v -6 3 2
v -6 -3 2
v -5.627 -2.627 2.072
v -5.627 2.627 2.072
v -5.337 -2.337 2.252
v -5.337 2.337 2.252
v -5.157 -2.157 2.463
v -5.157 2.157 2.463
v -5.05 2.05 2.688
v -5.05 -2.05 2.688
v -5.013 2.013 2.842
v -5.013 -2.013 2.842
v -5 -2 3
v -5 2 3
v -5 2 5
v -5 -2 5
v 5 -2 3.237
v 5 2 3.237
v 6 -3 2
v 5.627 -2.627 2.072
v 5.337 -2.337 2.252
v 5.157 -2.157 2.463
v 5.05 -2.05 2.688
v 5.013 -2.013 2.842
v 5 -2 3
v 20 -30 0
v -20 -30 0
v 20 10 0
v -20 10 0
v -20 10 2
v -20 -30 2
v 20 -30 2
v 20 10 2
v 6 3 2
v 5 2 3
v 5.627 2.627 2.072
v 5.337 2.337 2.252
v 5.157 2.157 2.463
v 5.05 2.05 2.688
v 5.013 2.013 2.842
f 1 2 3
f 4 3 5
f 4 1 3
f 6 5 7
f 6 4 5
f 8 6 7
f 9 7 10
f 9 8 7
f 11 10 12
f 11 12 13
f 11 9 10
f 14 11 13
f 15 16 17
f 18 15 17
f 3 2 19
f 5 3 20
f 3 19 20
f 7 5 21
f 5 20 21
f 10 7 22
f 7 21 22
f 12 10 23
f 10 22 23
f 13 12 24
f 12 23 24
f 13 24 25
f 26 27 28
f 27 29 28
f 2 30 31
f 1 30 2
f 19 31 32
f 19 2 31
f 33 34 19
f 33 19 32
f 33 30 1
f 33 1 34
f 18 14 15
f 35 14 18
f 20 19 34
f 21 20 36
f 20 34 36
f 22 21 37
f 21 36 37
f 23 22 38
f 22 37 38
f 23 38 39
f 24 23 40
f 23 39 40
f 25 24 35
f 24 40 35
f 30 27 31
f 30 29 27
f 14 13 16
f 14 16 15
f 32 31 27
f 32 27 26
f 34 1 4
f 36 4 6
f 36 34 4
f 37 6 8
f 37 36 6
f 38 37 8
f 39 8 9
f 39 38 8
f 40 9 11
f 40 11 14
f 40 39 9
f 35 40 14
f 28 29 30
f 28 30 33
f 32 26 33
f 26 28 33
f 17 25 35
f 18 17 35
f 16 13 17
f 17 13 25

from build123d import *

# Parameters (mm, degrees)
SKETCH_1_W          = 40
SKETCH_1_H          = 20
EXTRUDE_1_DEPTH     = 2
SKETCH_2_W          = 10
SKETCH_2_H          = 4
EXTRUDE_2_DEPTH     = 3
CUT_EXTRUDE_1_REACH = 25.854
SKETCH_4_W          = 40
SKETCH_4_H          = 2
EXTRUDE_3_DEPTH     = 20
FILLET_1_R          = 1


with BuildPart() as part:
    # 草图1 → 凸台-拉伸1 (new body)
    with BuildSketch(Plane.XY):
        Rectangle(SKETCH_1_W, SKETCH_1_H)
    extrude(amount=EXTRUDE_1_DEPTH)

    # 草图2 → 凸台-拉伸2 (add)
    with BuildSketch(Plane.XY.offset(2)):
        Rectangle(SKETCH_2_W, SKETCH_2_H)
    extrude(amount=EXTRUDE_2_DEPTH)

    # 草图3 → 切除-拉伸1 (cut, up to next)
    with BuildSketch(Plane.XZ.offset(2), mode=Mode.PRIVATE) as cut_extrude_1_sk1:
        Polygon((-5, 5), (5, 3.236730193), (5, 5), align=None)
    cut_extrude_1_tool1 = extrude(cut_extrude_1_sk1.sketch, amount=-CUT_EXTRUDE_1_REACH, mode=Mode.PRIVATE) & part.part
    add(cut_extrude_1_tool1.solids().sort_by_distance((1.666667, -2, 4.412243))[0], mode=Mode.SUBTRACT)

    # 草图4 → 凸台-拉伸3 (add)
    with BuildSketch(Plane.XZ.offset(10)):
        with Locations((0, 1)):
            Rectangle(SKETCH_4_W, SKETCH_4_H)
    extrude(amount=EXTRUDE_3_DEPTH)

    # 圆角1
    fillet_1_edges = [part.edges().sort_by_distance(p)[0] for p in [
        (5, 0, 2),
        (0, 2, 2),
        (-5, 0, 2),
        (0, -2, 2),
    ]]
    fillet(fillet_1_edges, radius=FILLET_1_R)


solid = part.part
